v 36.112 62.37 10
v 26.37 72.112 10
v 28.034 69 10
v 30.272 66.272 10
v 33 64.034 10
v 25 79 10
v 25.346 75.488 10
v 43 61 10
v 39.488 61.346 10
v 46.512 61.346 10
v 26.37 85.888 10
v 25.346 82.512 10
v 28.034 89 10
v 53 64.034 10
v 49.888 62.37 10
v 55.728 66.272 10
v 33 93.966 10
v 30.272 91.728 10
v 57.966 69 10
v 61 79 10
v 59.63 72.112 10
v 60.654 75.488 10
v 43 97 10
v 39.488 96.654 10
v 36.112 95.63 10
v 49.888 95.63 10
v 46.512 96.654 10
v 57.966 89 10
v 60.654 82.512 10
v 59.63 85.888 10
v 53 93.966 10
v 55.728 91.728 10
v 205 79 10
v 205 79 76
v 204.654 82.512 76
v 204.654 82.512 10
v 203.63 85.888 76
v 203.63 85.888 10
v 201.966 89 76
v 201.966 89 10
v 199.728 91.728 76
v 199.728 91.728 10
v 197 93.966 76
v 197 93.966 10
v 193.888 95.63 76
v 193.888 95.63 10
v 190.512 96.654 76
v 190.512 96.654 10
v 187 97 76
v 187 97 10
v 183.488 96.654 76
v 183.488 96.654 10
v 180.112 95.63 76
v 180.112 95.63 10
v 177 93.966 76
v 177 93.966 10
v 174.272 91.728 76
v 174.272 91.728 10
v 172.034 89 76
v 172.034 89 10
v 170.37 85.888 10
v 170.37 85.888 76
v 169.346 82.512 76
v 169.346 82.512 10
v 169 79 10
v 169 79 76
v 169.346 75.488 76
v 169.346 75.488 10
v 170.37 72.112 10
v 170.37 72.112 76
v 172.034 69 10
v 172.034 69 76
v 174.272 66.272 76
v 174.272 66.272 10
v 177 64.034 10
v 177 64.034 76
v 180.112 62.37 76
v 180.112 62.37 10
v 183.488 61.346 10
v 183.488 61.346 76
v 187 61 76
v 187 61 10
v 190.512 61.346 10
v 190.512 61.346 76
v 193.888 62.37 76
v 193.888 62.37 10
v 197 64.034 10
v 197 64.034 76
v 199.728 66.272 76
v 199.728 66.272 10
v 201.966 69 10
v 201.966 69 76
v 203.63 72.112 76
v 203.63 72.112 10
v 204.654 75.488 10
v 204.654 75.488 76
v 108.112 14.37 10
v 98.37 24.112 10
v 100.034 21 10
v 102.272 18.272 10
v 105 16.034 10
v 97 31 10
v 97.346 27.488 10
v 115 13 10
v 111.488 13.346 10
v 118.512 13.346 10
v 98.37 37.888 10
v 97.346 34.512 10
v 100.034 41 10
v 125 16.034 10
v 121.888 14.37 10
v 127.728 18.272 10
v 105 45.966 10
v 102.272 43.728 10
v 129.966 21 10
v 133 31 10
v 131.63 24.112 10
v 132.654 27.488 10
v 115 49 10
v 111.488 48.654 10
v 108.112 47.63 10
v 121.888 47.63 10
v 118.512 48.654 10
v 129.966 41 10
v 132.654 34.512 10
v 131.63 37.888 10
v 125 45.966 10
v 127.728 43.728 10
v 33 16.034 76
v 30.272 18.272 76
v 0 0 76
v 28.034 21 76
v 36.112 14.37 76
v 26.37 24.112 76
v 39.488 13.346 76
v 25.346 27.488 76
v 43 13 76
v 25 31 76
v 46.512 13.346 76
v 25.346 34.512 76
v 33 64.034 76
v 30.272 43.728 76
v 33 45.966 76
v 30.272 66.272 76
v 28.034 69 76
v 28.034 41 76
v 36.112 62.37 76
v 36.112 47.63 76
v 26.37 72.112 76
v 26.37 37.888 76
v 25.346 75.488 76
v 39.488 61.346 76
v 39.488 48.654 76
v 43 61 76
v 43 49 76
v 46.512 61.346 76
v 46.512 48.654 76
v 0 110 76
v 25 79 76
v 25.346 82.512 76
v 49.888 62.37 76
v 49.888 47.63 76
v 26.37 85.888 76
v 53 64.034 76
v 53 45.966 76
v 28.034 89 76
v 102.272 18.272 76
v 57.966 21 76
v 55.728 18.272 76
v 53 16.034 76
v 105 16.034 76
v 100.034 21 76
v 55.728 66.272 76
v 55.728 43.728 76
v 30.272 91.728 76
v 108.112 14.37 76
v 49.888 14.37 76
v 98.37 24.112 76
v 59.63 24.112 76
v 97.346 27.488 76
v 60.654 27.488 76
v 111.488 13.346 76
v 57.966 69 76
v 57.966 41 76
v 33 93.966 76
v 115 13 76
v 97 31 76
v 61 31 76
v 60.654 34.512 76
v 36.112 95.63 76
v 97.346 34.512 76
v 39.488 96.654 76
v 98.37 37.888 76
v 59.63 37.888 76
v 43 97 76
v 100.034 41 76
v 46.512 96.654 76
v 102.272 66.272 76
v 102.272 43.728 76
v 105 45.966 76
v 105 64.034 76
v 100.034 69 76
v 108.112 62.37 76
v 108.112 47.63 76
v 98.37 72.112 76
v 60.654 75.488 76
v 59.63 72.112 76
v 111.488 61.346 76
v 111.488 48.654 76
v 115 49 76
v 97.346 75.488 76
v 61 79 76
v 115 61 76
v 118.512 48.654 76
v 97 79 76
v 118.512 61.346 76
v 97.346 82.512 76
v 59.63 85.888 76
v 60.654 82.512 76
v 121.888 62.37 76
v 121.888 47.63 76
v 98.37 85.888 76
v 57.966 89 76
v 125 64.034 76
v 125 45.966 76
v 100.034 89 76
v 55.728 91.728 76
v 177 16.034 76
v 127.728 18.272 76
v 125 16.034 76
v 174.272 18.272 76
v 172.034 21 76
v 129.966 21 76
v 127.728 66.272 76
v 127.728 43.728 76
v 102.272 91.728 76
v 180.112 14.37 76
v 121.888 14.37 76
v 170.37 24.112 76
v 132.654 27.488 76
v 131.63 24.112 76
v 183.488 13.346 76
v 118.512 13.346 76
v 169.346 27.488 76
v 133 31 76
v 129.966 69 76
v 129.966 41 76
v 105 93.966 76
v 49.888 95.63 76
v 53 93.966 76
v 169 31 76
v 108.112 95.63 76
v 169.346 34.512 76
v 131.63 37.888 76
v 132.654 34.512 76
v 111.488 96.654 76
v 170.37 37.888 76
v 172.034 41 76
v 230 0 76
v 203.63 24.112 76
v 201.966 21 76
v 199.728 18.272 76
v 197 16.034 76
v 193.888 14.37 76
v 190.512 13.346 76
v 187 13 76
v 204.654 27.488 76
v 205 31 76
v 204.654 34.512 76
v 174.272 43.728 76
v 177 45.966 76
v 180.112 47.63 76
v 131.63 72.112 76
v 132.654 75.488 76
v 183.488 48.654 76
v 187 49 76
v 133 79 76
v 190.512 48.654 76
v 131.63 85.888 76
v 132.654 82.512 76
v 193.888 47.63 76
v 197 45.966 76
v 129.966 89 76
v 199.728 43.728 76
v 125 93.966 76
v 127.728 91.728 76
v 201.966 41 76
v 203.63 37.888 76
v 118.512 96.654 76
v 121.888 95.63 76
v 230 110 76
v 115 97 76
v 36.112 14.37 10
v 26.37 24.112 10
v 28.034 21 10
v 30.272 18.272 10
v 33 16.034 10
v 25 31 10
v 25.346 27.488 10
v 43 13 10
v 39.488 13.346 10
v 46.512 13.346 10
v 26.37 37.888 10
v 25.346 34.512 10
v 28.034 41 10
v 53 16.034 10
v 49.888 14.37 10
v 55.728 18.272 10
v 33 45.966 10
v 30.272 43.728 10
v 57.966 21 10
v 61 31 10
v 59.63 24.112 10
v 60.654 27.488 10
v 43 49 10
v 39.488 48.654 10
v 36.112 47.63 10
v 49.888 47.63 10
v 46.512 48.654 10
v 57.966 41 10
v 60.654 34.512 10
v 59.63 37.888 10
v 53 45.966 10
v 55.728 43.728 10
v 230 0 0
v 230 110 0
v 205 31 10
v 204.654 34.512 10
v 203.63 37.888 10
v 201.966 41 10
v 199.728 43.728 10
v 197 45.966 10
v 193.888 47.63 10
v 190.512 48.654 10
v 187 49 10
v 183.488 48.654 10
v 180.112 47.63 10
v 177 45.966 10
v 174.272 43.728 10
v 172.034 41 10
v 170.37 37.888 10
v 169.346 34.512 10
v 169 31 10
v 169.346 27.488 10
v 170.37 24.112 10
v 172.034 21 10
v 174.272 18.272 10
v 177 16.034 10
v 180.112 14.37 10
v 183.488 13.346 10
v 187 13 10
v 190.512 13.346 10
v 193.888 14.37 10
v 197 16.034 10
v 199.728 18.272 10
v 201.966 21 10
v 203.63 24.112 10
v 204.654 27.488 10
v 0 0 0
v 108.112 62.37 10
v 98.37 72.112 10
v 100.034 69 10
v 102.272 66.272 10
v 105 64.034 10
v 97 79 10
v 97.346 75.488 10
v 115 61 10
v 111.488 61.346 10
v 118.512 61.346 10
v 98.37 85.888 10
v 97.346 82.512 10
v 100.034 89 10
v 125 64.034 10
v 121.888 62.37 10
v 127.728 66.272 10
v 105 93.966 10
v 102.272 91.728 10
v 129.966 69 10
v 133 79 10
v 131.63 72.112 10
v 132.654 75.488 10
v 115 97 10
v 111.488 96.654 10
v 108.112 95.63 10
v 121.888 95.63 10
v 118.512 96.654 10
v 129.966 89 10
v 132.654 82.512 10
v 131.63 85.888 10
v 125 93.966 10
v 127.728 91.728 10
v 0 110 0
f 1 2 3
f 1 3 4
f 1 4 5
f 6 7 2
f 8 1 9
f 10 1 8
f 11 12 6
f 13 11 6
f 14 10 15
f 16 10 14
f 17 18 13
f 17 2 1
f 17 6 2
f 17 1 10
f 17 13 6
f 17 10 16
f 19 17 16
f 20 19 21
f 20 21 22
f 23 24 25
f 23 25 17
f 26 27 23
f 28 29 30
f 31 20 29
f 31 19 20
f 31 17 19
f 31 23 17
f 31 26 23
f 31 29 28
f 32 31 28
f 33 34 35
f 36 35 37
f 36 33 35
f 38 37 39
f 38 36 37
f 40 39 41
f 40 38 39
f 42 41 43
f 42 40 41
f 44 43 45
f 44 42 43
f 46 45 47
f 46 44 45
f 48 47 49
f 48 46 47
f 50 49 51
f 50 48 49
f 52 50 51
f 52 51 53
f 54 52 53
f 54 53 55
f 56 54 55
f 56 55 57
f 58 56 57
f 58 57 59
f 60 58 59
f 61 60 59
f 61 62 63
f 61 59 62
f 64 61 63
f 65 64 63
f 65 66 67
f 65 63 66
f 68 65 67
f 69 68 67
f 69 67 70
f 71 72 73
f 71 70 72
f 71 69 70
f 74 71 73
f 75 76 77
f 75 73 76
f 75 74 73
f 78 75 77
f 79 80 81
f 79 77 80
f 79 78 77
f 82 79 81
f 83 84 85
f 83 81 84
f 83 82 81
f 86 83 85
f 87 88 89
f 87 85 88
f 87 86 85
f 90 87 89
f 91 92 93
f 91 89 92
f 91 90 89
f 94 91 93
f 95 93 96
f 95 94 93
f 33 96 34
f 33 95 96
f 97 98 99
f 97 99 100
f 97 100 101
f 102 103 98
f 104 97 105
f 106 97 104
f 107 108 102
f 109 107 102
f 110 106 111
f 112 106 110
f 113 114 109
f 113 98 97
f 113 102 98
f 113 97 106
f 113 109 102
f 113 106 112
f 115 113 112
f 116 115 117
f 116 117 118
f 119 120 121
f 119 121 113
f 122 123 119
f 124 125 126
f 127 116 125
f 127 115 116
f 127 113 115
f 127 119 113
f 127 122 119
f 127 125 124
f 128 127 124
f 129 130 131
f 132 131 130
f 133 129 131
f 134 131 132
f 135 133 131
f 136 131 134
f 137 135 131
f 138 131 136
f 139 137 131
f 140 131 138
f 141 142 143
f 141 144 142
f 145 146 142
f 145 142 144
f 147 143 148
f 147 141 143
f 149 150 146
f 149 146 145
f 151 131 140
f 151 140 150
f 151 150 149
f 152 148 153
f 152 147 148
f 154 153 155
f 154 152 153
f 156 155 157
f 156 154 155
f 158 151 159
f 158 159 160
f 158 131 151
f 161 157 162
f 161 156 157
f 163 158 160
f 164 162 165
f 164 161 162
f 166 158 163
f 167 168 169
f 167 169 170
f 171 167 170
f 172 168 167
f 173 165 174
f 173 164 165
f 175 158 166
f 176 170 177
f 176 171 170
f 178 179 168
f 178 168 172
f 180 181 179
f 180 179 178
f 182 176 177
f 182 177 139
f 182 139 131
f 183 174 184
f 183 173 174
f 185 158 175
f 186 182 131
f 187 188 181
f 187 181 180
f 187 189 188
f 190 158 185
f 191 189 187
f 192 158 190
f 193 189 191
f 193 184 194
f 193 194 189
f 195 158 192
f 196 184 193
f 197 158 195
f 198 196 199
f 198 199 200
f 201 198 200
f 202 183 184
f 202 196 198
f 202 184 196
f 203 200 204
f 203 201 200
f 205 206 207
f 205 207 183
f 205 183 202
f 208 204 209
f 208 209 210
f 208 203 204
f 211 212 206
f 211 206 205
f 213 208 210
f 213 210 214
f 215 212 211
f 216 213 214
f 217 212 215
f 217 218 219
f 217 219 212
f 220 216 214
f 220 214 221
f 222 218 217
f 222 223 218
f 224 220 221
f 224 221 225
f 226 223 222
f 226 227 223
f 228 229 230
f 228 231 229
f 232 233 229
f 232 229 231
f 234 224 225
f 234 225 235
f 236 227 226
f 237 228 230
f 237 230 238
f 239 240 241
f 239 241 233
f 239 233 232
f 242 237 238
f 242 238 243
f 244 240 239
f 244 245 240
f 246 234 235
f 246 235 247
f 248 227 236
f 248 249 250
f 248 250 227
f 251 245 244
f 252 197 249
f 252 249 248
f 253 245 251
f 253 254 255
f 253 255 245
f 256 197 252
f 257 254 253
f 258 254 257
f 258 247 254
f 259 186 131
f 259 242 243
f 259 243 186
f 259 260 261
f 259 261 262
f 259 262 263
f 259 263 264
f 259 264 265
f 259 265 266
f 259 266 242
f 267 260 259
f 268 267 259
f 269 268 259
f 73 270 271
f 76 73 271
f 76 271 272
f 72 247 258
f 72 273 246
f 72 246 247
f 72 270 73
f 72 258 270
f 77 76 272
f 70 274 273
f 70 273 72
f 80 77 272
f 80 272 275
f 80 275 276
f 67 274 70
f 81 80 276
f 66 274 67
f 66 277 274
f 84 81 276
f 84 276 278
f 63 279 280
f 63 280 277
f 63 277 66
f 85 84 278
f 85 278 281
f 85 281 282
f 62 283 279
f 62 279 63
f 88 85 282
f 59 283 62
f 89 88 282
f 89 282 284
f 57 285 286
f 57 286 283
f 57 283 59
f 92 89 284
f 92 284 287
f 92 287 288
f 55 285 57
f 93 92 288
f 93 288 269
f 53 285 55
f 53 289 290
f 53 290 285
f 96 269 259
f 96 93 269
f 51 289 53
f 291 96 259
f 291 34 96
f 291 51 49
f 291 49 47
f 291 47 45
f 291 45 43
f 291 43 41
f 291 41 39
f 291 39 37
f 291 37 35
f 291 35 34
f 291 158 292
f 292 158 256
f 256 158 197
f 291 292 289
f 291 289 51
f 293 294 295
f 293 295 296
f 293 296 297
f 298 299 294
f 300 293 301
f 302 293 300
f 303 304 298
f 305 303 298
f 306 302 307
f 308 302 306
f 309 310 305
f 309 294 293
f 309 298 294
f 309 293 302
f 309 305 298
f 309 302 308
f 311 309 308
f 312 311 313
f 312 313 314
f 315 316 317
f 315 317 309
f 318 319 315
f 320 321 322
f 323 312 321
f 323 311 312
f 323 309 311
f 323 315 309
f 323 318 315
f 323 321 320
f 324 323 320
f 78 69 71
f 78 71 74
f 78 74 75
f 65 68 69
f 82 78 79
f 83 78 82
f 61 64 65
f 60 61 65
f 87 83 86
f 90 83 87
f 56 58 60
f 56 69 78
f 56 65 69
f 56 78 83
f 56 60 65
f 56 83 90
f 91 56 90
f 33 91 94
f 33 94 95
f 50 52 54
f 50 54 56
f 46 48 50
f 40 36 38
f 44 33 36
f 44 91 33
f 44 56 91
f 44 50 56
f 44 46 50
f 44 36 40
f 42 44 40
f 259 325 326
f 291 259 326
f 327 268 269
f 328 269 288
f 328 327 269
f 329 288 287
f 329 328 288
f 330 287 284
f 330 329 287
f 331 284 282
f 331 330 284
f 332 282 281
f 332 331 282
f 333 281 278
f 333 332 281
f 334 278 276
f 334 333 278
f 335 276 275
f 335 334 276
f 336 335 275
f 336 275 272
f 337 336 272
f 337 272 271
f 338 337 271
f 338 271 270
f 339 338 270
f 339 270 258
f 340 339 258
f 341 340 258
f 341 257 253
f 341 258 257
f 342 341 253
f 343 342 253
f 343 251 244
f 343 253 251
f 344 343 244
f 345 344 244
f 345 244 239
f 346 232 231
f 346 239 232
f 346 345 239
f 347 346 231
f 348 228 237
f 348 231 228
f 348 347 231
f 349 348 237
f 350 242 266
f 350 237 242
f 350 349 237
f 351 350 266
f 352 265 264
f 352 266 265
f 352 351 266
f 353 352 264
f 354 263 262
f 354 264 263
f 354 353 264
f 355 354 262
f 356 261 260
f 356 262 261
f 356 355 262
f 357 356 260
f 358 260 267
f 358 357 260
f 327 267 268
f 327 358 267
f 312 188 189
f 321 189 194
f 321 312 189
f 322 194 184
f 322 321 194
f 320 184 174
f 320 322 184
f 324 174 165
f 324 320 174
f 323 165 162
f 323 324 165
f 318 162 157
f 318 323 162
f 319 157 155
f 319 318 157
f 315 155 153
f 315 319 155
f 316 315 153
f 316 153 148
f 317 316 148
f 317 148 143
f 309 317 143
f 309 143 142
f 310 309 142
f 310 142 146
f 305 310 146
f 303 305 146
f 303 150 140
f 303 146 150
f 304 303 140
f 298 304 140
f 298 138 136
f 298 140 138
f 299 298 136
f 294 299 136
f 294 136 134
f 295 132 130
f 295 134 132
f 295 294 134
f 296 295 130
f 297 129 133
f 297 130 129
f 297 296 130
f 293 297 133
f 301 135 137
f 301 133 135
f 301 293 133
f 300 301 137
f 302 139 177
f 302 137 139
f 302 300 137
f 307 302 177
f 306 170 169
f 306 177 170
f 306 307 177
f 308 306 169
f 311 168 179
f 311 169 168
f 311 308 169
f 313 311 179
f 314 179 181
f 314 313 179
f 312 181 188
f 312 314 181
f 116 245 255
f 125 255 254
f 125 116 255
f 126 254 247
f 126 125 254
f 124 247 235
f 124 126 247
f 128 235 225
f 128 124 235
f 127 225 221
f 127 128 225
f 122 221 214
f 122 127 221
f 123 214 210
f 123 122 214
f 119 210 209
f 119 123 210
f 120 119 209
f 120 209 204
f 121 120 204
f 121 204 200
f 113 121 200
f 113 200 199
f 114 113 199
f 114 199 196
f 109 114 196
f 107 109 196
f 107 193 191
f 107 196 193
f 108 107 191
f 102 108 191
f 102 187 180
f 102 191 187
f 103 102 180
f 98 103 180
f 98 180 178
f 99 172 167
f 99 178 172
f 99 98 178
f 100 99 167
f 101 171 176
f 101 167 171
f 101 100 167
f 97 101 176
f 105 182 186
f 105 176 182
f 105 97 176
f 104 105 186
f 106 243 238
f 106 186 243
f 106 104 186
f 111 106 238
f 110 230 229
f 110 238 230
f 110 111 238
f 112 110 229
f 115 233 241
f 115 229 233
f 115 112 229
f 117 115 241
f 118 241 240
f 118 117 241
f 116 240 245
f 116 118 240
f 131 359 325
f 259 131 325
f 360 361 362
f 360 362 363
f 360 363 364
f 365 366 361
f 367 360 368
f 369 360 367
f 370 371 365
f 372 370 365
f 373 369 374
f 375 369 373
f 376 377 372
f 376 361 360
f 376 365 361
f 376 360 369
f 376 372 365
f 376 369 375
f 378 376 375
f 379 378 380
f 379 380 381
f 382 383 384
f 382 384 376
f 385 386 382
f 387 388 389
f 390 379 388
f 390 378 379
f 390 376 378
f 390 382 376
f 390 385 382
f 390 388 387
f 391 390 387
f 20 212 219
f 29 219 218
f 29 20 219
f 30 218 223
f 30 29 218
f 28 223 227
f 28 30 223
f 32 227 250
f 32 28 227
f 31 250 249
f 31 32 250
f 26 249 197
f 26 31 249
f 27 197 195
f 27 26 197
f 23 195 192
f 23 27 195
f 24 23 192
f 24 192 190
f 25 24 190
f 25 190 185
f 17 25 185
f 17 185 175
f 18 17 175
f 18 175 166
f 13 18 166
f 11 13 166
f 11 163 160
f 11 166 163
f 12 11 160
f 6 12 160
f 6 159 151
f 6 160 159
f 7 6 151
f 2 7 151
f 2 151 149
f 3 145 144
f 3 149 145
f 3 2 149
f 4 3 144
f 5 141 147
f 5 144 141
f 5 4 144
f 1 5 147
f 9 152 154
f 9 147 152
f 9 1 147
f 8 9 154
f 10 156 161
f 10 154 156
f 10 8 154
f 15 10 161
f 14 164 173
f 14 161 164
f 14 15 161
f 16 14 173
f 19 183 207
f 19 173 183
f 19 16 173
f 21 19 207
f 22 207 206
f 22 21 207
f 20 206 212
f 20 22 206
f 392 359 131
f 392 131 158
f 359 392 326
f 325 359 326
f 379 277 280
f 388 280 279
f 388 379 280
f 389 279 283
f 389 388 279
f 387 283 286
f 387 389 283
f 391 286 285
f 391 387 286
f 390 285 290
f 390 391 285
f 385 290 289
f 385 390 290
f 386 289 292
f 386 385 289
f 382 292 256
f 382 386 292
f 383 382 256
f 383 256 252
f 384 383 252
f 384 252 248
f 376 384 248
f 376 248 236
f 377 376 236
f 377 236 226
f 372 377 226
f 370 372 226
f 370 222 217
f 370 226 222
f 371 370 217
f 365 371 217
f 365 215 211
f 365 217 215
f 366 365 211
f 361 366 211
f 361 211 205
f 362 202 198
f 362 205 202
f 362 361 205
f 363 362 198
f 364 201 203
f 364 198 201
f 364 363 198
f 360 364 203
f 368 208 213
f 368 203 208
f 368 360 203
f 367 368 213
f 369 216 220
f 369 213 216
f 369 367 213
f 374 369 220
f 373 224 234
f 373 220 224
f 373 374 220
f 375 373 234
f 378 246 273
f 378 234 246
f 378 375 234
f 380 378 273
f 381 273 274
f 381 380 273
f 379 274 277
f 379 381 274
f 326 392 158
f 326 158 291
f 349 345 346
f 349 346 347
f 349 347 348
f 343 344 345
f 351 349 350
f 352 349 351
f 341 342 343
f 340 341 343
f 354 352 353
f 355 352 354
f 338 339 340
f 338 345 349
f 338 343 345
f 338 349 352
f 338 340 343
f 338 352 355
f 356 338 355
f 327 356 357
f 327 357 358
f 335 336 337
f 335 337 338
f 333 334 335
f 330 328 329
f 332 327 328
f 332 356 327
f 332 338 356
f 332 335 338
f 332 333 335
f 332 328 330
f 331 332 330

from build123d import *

# Parameters (mm, degrees)
CYLINDER003_R     = 18
CYLINDER003_DEPTH = 80
CYLINDER002_R     = 18
CYLINDER002_DEPTH = 80
CYLINDER005_R     = 18
CYLINDER005_DEPTH = 80
CYLINDER004_R     = 18
CYLINDER004_DEPTH = 80
CYLINDER001_R     = 18
CYLINDER001_DEPTH = 80
CYLINDER_R        = 18
CYLINDER_DEPTH    = 80
BOX_W             = 230
BOX_H             = 110
BOX_DEPTH         = 76


with BuildPart() as cylinder003:
    # Cylinder003 → Cylinder003 (new body)
    with BuildSketch(Plane(origin=(43, 79, 0), x_dir=(1, 0, 0), z_dir=(0, 0, 1))):
        Circle(CYLINDER003_R)
    extrude(amount=CYLINDER003_DEPTH)


with BuildPart() as fusion001:
    # Cylinder002 → Cylinder002 (new body)
    with BuildSketch(Plane(origin=(43, 31, 0), x_dir=(1, 0, 0), z_dir=(0, 0, 1))):
        Circle(CYLINDER002_R)
    extrude(amount=CYLINDER002_DEPTH)

    # Fusion001: union Cylinder003
    add(cylinder003.part)


with BuildPart() as fusion001_1:
    # Fusion001 placement: moved
    add(fusion001.part.moved(Location((72, 0, 0))))


with BuildPart() as cylinder005:
    # Cylinder005 → Cylinder005 (new body)
    with BuildSketch(Plane(origin=(43, 79, 0), x_dir=(1, 0, 0), z_dir=(0, 0, 1))):
        Circle(CYLINDER005_R)
    extrude(amount=CYLINDER005_DEPTH)


with BuildPart() as fusion002:
    # Cylinder004 → Cylinder004 (new body)
    with BuildSketch(Plane(origin=(43, 31, 0), x_dir=(1, 0, 0), z_dir=(0, 0, 1))):
        Circle(CYLINDER004_R)
    extrude(amount=CYLINDER004_DEPTH)

    # Fusion002: union Cylinder005
    add(cylinder005.part)


with BuildPart() as fusion002_1:
    # Fusion002 placement: moved
    add(fusion002.part.moved(Location((144, 0, 0))))


with BuildPart() as cylinder001:
    # Cylinder001 → Cylinder001 (new body)
    with BuildSketch(Plane(origin=(43, 79, 0), x_dir=(1, 0, 0), z_dir=(0, 0, 1))):
        Circle(CYLINDER001_R)
    extrude(amount=CYLINDER001_DEPTH)


with BuildPart() as fusion003:
    # Cylinder → Cylinder (new body)
    with BuildSketch(Plane(origin=(43, 31, 0), x_dir=(1, 0, 0), z_dir=(0, 0, 1))):
        Circle(CYLINDER_R)
    extrude(amount=CYLINDER_DEPTH)

    # Fusion: union Cylinder001
    add(cylinder001.part)

    # Fusion003: union Fusion001, Fusion002
    add(fusion001_1.part)
    add(fusion002_1.part)


with BuildPart() as fusion003_1:
    # Fusion003 placement: moved
    add(fusion003.part.moved(Location((0, 0, 10))))


with BuildPart() as cut:
    # Box → Box (new body)
    with BuildSketch(Plane.XY):
        with Locations((115, 55)):
            Rectangle(BOX_W, BOX_H)
    extrude(amount=BOX_DEPTH)

    # Cut: cut Fusion003
    add(fusion003_1.part, mode=Mode.SUBTRACT)


solid = cut.part
